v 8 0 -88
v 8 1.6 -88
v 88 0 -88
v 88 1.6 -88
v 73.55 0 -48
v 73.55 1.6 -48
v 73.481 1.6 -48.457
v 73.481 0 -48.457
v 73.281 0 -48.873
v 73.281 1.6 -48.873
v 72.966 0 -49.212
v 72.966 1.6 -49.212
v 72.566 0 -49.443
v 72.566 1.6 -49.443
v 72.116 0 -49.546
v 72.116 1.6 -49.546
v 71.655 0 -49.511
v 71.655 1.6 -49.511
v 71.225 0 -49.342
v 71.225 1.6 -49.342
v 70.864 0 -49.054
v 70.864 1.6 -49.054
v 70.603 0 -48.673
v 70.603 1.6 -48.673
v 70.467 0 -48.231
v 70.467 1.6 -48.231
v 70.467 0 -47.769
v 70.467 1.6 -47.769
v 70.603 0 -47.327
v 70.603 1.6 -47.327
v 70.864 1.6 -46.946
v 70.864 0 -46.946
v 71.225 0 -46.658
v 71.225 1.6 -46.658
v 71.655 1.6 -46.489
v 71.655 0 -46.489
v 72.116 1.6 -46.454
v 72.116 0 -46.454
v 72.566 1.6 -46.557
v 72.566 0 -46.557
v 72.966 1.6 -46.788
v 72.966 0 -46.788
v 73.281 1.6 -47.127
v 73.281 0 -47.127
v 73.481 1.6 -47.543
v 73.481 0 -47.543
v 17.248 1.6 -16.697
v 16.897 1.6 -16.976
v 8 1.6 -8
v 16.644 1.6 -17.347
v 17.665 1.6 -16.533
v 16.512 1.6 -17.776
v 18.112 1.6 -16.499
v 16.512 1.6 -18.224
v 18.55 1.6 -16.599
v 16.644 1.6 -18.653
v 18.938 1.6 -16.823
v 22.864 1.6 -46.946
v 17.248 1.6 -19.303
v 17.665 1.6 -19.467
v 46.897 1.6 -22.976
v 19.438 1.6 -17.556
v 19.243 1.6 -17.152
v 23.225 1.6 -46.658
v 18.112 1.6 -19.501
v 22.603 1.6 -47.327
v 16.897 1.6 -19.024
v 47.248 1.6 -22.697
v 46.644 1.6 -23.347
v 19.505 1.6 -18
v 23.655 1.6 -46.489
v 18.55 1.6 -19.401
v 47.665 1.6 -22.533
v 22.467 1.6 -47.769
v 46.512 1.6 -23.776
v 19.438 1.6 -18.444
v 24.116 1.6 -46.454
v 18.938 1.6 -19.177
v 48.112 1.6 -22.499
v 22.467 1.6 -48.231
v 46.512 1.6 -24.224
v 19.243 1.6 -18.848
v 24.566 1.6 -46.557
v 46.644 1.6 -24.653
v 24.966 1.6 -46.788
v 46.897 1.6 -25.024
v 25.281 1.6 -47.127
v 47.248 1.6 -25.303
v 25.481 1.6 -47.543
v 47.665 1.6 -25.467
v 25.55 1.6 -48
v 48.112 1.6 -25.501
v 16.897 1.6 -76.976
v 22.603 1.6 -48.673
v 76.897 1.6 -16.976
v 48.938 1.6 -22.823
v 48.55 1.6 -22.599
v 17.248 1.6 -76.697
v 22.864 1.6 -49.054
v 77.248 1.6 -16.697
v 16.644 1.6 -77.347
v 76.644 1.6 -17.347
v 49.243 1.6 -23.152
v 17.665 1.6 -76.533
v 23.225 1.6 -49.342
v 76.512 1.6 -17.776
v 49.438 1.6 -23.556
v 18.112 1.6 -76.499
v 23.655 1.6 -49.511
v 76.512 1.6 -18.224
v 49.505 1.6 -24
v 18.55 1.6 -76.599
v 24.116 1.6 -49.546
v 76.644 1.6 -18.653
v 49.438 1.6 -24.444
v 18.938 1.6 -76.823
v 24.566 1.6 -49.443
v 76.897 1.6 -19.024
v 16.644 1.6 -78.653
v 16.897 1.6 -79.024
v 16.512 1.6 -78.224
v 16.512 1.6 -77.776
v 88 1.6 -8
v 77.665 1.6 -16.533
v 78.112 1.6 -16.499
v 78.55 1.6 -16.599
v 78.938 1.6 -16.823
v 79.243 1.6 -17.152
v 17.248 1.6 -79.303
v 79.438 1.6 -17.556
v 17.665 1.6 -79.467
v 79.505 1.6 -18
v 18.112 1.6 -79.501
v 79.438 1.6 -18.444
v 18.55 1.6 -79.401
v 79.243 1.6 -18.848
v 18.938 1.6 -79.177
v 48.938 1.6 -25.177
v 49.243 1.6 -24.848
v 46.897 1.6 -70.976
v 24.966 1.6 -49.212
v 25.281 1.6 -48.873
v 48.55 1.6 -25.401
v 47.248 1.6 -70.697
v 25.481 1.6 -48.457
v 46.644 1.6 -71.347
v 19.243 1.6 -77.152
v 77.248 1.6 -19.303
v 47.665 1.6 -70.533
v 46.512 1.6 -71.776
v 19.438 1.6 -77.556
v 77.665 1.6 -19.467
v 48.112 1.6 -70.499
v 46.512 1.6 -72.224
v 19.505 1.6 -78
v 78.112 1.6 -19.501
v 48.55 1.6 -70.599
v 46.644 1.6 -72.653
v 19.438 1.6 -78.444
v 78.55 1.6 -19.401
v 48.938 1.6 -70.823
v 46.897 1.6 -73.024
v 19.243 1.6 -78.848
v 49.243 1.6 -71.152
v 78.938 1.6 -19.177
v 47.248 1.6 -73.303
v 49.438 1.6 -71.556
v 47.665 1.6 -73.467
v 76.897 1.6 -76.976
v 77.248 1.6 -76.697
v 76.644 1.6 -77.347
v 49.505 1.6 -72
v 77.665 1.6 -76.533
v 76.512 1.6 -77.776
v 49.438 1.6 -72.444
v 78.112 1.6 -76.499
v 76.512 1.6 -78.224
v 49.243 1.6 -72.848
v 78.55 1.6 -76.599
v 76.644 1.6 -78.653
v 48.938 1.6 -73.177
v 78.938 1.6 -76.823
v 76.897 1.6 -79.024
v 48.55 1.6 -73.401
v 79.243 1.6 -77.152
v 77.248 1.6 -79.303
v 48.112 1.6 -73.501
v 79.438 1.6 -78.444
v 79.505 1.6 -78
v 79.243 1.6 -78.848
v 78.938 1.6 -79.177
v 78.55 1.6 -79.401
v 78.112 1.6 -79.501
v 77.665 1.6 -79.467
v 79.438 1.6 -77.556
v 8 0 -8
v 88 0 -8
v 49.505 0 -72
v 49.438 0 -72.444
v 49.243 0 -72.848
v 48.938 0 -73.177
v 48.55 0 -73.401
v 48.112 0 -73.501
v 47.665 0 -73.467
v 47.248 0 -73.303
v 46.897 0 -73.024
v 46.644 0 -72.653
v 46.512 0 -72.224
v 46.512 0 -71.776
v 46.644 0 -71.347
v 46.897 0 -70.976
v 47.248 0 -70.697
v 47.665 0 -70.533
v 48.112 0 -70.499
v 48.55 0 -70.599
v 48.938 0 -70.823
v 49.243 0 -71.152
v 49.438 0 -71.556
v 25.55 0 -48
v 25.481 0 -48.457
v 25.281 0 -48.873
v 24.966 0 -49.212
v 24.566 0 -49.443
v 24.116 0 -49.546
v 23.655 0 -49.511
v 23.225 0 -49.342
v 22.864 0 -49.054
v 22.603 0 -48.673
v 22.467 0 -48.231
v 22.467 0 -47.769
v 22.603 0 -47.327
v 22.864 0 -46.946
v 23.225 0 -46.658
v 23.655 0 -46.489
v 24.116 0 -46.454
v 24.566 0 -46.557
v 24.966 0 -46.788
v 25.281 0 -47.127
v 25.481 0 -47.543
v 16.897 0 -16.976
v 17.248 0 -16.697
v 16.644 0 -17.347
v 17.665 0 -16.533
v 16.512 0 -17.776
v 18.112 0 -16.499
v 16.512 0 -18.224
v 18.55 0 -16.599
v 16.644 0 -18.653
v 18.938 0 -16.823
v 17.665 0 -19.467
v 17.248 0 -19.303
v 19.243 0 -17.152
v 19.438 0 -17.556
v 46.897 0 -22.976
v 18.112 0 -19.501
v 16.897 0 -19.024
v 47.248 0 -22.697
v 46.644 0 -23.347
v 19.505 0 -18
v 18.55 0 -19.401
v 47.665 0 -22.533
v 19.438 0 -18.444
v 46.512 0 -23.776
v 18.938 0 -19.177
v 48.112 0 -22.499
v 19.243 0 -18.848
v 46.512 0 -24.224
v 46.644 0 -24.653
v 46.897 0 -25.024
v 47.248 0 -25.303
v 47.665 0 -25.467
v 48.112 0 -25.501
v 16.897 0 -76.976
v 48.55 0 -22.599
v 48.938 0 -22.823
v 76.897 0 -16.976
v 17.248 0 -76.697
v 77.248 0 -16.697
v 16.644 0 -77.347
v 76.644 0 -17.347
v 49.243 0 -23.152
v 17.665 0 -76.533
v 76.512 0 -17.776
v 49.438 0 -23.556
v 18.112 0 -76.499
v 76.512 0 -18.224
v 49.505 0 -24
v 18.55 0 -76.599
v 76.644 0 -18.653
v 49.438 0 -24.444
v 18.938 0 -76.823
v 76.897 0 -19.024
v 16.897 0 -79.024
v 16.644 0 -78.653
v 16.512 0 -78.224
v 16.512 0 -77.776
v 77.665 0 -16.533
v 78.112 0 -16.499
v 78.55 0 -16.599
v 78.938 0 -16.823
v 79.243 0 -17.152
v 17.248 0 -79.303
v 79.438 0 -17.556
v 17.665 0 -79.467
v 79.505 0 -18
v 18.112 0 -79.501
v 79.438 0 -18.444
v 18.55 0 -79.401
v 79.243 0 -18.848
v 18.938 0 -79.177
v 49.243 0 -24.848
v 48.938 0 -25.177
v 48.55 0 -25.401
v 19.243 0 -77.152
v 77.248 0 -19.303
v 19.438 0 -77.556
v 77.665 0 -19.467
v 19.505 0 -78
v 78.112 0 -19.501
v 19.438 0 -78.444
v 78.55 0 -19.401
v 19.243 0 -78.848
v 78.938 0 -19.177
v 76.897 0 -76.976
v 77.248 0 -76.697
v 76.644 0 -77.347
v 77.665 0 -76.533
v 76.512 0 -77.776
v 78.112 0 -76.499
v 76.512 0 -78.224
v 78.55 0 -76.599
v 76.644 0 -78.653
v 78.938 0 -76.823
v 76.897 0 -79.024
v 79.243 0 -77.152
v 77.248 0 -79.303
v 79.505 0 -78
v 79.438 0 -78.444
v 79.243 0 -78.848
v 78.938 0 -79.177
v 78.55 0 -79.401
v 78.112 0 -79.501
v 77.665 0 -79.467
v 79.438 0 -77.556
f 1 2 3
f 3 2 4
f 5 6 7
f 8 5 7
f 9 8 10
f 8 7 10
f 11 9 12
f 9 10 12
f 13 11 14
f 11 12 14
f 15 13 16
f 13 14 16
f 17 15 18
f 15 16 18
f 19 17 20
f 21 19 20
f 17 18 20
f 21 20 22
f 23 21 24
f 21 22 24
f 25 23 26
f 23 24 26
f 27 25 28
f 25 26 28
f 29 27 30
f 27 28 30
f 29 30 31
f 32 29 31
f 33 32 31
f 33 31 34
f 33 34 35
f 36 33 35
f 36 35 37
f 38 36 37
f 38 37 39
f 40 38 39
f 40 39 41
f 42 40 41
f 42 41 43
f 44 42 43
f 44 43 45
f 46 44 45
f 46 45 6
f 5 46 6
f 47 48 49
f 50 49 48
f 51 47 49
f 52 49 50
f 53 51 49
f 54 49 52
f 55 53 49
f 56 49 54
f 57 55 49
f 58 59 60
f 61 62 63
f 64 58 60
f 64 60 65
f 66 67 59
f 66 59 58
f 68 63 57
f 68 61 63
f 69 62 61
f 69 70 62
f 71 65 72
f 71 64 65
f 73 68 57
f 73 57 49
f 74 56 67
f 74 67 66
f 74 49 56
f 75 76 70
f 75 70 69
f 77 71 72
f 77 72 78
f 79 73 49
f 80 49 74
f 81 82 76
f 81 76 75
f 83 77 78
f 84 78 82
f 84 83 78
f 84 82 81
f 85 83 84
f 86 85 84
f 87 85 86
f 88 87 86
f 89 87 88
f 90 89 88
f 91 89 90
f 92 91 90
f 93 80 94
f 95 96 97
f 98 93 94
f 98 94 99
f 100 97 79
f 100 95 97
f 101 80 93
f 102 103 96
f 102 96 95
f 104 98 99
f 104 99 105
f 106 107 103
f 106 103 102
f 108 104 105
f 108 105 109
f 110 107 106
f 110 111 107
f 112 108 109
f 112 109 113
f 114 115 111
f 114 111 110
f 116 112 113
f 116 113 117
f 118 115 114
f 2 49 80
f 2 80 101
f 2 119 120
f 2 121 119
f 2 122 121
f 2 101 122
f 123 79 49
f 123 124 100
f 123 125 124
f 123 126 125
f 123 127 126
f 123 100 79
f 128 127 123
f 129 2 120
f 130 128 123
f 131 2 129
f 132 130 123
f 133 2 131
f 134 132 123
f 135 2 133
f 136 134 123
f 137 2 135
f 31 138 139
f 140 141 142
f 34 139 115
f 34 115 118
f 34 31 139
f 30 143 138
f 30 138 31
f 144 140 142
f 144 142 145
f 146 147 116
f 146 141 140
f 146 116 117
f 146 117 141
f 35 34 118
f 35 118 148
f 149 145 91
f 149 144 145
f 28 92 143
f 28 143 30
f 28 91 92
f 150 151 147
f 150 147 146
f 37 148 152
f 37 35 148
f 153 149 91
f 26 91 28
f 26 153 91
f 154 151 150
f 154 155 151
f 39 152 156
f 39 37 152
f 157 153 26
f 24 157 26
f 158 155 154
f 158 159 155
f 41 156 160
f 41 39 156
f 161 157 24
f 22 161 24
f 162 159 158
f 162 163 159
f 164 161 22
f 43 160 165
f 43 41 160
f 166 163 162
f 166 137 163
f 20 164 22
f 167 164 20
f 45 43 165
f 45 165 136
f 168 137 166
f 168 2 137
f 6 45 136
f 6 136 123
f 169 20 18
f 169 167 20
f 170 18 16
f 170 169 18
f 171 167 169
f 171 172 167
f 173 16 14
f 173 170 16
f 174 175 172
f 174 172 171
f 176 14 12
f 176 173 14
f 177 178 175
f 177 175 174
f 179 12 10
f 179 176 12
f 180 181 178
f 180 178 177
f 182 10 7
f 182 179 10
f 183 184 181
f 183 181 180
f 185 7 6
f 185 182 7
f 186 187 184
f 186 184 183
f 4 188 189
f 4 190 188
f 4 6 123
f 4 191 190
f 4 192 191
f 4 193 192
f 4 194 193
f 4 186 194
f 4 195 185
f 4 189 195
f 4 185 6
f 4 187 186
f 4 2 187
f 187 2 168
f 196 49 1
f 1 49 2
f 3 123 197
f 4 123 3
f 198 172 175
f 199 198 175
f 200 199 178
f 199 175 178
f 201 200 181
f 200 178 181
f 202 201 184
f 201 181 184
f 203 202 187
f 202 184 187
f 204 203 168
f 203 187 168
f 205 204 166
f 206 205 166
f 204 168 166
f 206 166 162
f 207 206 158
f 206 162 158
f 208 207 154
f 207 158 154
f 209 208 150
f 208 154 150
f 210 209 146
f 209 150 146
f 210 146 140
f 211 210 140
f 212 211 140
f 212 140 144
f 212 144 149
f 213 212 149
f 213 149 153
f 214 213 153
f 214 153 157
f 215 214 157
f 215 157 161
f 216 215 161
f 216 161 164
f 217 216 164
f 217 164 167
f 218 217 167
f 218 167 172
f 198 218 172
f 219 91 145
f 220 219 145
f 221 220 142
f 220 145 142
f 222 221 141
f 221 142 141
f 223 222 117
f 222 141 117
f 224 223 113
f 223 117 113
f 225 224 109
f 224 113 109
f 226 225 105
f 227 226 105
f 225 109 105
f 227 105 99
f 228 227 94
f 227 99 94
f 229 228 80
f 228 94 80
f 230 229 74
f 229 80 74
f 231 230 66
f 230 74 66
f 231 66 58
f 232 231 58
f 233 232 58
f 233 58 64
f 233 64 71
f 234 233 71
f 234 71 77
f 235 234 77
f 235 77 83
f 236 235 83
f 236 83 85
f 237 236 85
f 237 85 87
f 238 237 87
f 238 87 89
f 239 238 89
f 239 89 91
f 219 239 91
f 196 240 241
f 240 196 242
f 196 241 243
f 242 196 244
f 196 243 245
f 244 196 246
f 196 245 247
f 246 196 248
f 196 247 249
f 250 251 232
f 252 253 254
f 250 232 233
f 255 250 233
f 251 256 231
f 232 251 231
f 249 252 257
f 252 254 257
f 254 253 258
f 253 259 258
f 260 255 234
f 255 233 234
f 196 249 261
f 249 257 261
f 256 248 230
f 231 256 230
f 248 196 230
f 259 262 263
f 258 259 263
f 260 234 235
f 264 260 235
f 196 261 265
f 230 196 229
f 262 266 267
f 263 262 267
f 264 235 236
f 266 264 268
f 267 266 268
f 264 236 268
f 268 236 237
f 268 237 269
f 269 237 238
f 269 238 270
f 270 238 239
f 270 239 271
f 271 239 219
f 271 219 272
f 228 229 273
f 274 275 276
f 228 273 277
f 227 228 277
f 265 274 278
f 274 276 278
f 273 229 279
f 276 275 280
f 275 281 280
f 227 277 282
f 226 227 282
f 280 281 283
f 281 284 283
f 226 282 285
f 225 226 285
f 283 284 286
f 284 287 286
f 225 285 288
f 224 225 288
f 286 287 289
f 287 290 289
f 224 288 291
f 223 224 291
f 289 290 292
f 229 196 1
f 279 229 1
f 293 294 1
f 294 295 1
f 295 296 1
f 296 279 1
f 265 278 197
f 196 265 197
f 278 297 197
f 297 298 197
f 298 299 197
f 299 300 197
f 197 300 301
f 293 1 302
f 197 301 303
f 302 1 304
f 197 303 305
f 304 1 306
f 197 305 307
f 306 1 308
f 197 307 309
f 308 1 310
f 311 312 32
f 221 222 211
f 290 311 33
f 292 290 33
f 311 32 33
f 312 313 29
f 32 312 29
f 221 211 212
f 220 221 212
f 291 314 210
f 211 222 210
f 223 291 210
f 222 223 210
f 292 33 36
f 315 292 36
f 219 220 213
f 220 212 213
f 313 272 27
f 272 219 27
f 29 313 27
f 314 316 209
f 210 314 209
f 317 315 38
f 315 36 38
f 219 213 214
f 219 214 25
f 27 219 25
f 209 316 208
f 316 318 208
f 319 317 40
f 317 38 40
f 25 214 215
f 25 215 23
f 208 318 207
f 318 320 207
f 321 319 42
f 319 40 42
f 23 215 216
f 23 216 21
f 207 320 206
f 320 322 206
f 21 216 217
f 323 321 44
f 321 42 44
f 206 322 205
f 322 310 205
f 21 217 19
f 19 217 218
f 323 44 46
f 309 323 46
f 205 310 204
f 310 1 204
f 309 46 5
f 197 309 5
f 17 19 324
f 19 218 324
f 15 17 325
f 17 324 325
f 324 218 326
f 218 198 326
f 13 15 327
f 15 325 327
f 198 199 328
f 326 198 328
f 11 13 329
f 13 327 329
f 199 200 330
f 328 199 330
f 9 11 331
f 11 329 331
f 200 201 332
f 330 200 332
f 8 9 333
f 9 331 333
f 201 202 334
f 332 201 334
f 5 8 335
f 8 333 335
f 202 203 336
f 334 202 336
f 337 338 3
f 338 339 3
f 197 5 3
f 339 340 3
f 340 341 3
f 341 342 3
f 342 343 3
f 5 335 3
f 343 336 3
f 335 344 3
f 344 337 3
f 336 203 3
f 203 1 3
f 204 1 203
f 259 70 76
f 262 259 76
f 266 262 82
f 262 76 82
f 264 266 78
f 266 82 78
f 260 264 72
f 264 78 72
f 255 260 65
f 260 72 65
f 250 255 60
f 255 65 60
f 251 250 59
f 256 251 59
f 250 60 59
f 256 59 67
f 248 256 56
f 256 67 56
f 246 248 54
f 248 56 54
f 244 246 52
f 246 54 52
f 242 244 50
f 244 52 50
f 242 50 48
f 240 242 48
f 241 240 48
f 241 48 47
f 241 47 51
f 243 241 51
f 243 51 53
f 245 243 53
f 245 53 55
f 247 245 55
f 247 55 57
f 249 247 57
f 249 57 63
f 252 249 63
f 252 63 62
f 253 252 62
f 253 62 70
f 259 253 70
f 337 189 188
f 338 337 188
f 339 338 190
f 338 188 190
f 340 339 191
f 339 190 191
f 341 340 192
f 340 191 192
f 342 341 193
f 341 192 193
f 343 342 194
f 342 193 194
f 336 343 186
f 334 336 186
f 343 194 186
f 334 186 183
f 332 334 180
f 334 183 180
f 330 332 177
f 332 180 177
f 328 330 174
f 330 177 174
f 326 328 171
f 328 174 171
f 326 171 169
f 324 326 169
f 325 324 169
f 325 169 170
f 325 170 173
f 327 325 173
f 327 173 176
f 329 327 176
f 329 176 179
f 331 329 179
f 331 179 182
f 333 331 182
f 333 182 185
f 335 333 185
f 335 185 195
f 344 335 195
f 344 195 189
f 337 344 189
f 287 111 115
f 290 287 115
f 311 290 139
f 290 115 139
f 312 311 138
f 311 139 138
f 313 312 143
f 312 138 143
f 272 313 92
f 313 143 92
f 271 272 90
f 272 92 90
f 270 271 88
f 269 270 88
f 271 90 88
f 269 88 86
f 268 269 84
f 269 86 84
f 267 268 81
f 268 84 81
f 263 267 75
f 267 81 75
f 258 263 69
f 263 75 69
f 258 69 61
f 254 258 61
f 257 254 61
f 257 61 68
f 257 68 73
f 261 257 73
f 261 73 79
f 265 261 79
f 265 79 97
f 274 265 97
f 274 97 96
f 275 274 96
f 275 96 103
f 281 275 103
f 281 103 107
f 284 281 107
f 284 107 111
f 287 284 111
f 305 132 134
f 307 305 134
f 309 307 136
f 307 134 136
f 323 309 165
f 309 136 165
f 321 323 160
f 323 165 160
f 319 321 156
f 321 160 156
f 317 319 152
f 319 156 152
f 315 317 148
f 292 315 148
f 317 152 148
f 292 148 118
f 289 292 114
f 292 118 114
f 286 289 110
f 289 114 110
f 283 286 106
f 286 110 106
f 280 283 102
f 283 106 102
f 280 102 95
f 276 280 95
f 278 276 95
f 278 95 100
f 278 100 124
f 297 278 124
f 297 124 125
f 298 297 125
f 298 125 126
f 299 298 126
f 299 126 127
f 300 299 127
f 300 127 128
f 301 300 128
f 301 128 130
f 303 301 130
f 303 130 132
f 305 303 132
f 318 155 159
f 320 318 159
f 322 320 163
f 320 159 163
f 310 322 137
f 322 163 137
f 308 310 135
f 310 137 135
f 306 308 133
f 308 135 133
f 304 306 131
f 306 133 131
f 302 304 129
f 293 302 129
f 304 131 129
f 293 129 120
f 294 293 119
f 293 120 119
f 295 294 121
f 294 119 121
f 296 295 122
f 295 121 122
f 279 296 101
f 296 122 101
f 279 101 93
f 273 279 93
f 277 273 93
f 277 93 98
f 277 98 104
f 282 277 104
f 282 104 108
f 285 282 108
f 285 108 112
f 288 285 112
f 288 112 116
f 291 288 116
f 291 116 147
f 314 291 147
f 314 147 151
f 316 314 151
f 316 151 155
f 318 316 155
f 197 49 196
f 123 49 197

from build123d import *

# Parameters (mm, degrees)
SKETCH2_W           = 96
SKETCH2_H           = 96
BOSS_EXTRUDE1_DEPTH = 1.6
SKETCH3_R           = 1.55
SKETCH3_R_2         = 1.505
CUT_EXTRUDE1_DEPTH  = 2.6
SKETCH4_OUTSIDE_W   = 125.154
SKETCH4_OUTSIDE_H   = 125.154
SKETCH4_OUTSIDE_W_2 = 80
SKETCH4_OUTSIDE_H_2 = 80
CUT_EXTRUDE2_DEPTH  = 10


with BuildPart() as part:
    # Sketch2 → Boss-Extrude1 (new body)
    with BuildSketch(Plane(origin=(0, 0, 0), x_dir=(1, 0, 0), z_dir=(0, 1, 0))):
        with Locations((48, 48)):
            Rectangle(SKETCH2_W, SKETCH2_H)
    extrude(amount=BOSS_EXTRUDE1_DEPTH)

    # Sketch3 → Cut-Extrude1 (cut, through all)
    with BuildSketch(Plane(origin=(0, 1.6, 0), x_dir=(1, 0, 0), z_dir=(0, 1, 0))):
        with Locations((24, 48)):
            Circle(SKETCH3_R)
        with Locations((72, 48)):
            Circle(SKETCH3_R)
        with Locations((48, 72)):
            Circle(SKETCH3_R_2)
        with Locations((48, 24)):
            Circle(SKETCH3_R_2)
        with Locations((18, 78)):
            Circle(SKETCH3_R_2)
        with Locations((78, 78)):
            Circle(SKETCH3_R_2)
        with Locations((78, 18)):
            Circle(SKETCH3_R_2)
        with Locations((18, 18)):
            Circle(SKETCH3_R_2)
    extrude(amount=-CUT_EXTRUDE1_DEPTH, mode=Mode.SUBTRACT)

    # Sketch4 outside → Cut-Extrude2 (cut)
    with BuildSketch(Plane(origin=(0, 1.6, 0), x_dir=(1, 0, 0), z_dir=(0, 1, 0))):
        with Locations((48, 48)):
            Rectangle(SKETCH4_OUTSIDE_W, SKETCH4_OUTSIDE_H)
        with Locations((48, 48)):
            Rectangle(SKETCH4_OUTSIDE_W_2, SKETCH4_OUTSIDE_H_2, mode=Mode.SUBTRACT)
    extrude(amount=-CUT_EXTRUDE2_DEPTH, mode=Mode.SUBTRACT)


solid = part.part
